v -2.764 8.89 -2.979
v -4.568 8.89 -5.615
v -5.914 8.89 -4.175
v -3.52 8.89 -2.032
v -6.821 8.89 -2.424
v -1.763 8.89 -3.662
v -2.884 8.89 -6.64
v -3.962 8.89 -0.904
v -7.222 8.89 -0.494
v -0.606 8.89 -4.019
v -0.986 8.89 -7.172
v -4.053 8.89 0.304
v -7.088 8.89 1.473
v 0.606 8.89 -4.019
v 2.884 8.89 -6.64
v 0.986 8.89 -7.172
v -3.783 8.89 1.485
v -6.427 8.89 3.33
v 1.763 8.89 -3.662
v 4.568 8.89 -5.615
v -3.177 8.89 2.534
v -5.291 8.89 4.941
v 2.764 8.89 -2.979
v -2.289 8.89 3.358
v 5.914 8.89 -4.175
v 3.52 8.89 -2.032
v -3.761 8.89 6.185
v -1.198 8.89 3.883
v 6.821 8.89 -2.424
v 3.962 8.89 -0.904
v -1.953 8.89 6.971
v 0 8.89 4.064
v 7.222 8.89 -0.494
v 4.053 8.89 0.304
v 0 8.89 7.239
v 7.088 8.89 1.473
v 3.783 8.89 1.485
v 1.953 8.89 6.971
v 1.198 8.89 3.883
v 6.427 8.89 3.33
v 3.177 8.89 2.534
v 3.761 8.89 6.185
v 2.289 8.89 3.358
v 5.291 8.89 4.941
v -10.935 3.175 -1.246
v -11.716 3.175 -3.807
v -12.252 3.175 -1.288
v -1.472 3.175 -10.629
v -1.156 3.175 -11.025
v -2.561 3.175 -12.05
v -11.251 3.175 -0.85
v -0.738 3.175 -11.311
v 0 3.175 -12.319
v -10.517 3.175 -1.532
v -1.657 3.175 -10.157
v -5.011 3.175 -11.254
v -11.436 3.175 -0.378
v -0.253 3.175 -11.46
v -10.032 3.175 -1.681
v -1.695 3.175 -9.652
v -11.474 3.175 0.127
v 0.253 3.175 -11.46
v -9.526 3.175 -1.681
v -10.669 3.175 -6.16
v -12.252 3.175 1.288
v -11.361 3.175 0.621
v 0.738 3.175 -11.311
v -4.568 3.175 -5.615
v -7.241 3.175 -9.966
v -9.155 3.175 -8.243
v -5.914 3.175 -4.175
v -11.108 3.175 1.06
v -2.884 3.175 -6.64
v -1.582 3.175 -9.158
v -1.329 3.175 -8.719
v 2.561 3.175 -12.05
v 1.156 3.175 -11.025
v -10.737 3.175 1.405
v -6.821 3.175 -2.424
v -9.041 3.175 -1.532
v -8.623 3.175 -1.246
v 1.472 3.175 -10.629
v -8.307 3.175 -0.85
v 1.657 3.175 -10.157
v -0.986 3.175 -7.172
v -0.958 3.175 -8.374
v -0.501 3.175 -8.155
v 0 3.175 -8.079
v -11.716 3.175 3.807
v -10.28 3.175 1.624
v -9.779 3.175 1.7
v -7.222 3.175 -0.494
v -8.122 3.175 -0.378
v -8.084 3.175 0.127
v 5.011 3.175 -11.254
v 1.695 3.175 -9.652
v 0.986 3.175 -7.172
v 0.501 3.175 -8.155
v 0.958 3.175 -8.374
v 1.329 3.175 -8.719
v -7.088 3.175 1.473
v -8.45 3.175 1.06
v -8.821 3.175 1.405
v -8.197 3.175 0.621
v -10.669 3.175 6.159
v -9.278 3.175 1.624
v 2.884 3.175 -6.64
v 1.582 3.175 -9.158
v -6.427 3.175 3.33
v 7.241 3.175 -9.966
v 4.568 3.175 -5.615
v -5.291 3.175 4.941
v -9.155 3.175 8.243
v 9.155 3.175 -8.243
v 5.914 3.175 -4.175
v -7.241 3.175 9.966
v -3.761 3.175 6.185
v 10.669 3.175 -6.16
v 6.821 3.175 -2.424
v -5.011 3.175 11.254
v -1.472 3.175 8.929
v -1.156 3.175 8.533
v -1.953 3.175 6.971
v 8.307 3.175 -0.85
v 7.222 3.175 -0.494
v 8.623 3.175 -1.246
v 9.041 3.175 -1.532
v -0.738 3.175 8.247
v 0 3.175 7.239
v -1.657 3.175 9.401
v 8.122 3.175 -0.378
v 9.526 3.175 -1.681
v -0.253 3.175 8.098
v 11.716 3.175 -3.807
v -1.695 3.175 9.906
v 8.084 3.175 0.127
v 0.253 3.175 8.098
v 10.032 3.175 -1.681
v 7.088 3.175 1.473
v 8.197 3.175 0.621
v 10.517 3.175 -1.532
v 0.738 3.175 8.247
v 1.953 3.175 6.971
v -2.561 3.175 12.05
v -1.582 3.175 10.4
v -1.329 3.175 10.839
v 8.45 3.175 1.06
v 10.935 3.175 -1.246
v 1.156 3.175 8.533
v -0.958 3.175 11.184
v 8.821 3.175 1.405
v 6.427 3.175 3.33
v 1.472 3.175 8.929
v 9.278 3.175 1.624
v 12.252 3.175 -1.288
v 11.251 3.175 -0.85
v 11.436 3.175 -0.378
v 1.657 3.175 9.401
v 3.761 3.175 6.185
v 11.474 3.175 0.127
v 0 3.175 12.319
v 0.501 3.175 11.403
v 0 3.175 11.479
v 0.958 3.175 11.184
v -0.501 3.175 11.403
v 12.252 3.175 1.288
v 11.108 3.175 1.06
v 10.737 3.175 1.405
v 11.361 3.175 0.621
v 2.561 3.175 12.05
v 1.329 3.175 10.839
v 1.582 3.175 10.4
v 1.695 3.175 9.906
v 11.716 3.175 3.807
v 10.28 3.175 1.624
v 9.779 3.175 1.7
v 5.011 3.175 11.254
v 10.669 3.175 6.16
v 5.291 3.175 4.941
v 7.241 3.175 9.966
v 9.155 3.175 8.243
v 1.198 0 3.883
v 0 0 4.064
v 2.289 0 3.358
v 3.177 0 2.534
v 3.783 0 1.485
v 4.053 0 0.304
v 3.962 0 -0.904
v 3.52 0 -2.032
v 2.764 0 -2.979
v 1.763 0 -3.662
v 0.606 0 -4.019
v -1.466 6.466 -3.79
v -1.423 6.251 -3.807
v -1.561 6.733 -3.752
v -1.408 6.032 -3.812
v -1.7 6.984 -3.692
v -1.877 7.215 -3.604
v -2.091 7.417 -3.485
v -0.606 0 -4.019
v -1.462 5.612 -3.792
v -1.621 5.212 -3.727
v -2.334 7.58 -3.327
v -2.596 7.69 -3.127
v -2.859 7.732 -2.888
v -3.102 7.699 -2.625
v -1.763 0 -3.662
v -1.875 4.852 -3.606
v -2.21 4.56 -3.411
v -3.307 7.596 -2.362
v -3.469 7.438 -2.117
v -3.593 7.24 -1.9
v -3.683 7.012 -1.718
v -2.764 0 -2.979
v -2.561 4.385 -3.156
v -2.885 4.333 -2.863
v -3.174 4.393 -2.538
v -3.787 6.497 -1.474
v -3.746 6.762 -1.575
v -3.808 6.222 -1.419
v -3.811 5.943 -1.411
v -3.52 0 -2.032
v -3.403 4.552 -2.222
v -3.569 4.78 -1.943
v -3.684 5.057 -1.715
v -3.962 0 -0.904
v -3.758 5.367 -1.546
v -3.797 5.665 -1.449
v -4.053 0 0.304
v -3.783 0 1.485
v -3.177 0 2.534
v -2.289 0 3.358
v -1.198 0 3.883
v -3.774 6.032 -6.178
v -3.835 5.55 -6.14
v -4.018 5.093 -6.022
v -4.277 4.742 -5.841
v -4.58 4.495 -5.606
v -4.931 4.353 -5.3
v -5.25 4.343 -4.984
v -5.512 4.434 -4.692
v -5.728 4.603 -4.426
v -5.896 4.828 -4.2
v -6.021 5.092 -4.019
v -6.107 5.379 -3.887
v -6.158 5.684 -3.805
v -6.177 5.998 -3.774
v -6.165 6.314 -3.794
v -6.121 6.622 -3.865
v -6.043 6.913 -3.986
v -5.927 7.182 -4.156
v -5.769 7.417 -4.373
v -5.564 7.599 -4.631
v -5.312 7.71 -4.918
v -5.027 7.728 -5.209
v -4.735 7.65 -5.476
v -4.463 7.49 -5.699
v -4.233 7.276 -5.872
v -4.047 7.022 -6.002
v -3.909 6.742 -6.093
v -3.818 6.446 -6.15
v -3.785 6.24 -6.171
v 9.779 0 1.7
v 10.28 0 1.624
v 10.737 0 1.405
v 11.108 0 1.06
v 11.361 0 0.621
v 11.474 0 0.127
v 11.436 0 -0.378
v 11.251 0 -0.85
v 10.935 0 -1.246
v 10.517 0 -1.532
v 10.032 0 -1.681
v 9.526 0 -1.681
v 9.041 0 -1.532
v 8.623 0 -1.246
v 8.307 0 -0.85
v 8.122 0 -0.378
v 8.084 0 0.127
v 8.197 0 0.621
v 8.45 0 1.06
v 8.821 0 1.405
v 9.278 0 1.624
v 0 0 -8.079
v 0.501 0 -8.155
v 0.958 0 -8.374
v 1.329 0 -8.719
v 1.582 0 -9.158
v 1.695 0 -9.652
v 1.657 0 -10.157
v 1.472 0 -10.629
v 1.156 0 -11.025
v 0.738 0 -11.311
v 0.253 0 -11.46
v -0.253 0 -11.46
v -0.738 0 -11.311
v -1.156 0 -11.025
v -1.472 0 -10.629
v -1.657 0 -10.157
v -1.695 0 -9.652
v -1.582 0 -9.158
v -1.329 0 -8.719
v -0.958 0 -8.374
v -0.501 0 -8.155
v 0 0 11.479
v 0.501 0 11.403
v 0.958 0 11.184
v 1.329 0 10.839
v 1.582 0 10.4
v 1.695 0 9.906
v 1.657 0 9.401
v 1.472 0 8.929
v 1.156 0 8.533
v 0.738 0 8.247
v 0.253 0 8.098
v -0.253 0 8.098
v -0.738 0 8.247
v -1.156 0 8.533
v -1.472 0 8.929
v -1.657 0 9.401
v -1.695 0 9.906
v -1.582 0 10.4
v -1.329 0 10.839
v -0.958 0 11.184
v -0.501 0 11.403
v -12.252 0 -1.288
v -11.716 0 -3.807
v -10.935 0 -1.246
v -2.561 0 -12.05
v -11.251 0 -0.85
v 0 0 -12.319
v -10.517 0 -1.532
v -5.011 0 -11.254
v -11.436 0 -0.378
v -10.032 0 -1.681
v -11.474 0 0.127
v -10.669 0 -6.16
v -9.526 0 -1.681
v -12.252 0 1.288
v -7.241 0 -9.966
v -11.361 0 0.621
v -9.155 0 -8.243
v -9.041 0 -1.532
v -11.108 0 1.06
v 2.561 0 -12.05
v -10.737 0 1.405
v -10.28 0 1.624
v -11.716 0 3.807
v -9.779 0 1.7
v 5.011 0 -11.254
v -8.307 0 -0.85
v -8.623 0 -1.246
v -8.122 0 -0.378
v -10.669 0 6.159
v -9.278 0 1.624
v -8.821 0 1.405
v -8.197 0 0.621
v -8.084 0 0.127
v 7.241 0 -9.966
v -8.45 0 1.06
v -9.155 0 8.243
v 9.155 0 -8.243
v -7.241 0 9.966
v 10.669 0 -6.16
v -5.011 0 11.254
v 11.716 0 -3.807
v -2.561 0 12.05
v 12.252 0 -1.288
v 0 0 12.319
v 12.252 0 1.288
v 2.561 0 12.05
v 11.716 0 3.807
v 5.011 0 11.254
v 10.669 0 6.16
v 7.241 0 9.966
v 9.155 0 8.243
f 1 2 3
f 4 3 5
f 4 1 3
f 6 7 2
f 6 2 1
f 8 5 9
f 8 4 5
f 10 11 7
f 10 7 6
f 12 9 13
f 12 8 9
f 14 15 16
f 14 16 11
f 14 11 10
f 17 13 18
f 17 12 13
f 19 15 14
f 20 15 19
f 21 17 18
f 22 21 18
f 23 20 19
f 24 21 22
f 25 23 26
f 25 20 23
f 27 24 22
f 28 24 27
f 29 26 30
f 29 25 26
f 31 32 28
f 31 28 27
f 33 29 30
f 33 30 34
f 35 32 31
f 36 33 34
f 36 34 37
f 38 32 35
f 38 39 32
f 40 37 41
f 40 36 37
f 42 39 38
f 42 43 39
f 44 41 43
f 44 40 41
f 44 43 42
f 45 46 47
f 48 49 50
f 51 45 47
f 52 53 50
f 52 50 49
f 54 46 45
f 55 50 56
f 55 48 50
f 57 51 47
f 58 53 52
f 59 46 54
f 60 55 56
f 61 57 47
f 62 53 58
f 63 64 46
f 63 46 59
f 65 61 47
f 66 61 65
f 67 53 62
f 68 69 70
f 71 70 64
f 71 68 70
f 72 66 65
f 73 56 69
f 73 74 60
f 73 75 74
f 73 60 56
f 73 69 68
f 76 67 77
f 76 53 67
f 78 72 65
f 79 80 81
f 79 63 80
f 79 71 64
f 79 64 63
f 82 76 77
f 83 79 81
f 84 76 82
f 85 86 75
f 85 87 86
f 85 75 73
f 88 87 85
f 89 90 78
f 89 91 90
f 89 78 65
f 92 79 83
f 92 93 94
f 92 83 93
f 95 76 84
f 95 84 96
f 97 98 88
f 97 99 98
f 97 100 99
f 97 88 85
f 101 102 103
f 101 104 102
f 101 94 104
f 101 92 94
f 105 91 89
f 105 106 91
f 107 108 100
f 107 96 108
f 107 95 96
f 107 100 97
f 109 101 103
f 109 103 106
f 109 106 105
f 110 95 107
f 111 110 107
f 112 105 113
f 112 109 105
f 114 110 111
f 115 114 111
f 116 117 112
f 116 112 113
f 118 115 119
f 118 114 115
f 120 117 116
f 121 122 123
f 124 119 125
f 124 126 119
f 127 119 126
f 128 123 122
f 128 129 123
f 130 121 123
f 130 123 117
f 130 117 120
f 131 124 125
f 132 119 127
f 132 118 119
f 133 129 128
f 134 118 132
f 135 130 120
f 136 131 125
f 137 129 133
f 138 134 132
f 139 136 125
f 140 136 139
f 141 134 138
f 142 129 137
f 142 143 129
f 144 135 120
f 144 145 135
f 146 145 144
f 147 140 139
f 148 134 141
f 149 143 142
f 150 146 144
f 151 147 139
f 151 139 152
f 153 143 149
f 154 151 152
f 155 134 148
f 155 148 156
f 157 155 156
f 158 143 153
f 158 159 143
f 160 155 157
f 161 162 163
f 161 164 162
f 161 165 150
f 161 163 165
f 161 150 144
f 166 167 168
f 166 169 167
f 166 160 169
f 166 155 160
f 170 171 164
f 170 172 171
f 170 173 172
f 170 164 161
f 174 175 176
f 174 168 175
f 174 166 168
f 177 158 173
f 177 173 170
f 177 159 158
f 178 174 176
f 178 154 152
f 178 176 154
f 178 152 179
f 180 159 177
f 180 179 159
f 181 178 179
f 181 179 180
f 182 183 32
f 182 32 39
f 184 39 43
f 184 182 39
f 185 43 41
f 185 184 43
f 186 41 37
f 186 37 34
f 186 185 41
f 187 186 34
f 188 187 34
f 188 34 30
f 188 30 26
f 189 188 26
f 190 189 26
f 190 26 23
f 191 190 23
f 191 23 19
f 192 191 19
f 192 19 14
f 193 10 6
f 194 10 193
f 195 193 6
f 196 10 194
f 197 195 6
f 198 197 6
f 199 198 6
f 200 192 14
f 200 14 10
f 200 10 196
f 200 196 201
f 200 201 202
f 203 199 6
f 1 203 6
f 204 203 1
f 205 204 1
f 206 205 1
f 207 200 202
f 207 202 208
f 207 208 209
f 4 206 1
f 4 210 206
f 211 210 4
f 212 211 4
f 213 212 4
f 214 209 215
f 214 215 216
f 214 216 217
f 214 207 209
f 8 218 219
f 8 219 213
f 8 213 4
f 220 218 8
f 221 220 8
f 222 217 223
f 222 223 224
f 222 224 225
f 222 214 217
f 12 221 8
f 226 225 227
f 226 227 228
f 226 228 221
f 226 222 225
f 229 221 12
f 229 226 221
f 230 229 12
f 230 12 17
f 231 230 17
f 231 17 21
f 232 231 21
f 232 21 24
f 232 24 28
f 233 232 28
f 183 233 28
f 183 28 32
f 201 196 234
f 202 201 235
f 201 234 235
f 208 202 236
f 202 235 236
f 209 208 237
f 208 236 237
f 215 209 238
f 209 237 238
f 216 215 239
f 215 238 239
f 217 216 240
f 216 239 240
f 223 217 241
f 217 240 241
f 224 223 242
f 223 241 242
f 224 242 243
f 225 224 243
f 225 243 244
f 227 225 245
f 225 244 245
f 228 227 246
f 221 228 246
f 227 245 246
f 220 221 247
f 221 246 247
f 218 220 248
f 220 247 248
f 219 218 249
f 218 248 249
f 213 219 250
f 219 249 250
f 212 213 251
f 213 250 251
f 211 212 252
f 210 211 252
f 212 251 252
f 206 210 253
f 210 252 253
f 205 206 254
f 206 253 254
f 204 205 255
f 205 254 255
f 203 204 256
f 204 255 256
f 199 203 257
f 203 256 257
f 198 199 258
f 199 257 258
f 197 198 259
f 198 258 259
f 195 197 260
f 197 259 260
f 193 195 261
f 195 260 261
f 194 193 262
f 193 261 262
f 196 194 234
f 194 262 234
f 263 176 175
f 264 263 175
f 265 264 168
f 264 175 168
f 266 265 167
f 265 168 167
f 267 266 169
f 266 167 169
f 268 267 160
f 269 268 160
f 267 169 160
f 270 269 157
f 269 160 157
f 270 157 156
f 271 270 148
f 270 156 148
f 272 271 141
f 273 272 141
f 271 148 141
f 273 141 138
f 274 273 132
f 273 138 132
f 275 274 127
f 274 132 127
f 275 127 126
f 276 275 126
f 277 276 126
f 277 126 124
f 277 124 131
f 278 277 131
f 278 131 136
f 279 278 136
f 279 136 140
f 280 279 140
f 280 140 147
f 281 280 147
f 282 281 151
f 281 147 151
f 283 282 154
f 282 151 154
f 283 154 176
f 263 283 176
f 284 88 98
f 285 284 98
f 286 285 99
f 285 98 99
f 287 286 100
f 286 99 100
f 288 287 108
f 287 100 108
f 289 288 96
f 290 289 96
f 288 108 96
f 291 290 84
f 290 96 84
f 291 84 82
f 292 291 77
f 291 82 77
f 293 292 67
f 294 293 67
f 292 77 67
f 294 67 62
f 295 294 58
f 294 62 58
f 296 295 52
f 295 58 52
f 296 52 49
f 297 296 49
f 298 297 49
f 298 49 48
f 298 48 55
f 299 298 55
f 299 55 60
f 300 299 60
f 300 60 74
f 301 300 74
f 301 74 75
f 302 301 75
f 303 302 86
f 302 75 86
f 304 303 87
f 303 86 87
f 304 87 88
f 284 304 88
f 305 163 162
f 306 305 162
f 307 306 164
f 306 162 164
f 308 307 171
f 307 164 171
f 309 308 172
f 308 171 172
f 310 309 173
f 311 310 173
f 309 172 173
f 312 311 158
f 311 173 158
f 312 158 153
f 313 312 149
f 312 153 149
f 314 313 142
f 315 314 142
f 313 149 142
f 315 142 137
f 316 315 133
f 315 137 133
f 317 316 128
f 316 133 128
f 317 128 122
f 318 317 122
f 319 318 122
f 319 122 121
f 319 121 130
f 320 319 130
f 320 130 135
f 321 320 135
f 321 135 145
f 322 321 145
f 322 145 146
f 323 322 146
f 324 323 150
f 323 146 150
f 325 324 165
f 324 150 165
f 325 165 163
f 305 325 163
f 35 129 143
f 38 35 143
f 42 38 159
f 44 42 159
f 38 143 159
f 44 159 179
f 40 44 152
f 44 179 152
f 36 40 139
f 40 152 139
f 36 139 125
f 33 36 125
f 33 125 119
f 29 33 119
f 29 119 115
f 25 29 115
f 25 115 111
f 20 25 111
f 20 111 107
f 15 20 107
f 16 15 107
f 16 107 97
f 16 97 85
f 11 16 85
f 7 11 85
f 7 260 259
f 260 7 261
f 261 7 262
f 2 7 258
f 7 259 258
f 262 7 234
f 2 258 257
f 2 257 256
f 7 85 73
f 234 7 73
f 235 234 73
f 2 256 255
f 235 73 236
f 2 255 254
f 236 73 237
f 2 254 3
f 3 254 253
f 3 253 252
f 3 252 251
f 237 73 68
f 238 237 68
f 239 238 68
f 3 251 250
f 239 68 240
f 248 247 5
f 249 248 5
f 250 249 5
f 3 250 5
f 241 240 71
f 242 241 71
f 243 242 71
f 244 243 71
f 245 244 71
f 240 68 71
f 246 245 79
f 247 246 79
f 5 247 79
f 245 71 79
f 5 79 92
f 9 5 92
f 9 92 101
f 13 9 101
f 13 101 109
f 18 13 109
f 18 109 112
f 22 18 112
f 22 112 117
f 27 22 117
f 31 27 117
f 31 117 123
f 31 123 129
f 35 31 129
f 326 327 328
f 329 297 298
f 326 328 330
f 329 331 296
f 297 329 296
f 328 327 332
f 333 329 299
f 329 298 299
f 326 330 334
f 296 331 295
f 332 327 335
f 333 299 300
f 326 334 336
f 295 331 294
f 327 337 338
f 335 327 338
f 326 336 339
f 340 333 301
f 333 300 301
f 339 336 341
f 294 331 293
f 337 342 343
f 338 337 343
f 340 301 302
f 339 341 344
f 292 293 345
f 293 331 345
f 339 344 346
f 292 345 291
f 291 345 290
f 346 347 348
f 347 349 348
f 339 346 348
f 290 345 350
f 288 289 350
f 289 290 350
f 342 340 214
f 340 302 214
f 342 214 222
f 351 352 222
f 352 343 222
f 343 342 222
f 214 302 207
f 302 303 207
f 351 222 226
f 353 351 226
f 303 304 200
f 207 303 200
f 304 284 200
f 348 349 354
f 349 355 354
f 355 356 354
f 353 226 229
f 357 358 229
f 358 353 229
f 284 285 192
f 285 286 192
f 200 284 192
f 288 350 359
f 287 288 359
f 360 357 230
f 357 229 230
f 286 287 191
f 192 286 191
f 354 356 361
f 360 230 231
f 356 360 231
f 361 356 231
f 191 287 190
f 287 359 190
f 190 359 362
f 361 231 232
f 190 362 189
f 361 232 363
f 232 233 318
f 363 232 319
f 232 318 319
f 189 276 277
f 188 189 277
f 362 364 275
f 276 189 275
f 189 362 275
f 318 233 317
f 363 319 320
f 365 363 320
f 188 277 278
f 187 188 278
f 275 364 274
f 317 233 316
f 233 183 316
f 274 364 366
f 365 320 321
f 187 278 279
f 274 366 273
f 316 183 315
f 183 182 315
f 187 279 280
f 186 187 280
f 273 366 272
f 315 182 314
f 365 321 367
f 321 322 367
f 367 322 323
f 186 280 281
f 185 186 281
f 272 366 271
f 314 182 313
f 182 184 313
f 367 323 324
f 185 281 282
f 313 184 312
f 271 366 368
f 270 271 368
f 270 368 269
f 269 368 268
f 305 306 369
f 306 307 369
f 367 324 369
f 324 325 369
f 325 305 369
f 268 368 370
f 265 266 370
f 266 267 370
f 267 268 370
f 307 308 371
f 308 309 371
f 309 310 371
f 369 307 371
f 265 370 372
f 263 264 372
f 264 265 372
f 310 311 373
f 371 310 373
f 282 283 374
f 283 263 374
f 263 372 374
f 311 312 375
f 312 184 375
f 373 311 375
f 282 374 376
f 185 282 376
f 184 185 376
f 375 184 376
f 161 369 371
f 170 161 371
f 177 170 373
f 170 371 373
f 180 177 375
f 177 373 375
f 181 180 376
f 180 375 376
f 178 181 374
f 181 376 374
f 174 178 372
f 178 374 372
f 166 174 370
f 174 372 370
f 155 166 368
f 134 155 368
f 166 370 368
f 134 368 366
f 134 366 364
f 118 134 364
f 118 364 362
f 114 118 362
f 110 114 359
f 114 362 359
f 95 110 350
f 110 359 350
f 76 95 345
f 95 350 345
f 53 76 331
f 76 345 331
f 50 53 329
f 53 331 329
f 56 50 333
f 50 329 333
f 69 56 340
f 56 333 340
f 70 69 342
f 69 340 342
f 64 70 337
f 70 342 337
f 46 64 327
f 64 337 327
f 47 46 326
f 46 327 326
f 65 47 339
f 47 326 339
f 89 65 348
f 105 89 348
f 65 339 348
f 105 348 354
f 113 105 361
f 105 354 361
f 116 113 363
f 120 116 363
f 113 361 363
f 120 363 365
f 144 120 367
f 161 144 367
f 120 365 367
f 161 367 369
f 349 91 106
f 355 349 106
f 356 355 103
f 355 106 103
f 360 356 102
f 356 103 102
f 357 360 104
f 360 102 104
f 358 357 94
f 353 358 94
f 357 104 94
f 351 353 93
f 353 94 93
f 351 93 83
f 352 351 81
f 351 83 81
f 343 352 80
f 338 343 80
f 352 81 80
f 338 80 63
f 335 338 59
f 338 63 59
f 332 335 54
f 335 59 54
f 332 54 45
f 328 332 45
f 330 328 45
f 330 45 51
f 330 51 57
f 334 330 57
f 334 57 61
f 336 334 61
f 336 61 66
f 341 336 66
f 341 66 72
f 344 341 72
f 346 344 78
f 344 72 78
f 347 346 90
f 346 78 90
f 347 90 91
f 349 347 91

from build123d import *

# Parameters (mm, degrees)
SKETCH1_R                           = 7.239
SKETCH1_R_2                         = 4.064
BOSS_EXTRUDE1_DEPTH                 = 8.89
SKETCH1_3_R                         = 12.319
SKETCH1_3_R_2                       = 7.239
BOSS_EXTRUDE2_DEPTH                 = 3.175
SKETCH2_R                           = 1.7
CUT_EXTRUDE1_DEPTH                  = 3.175
CUT_EXTRUDE2_REACH                  = 27.909
CUT_EXTRUDE2_END_RADIUS             = 4.064
SKETCH5_R                           = 1.7
CUT_EXTRUDE2_DIRECTION_2_REACH      = 27.909
CUT_EXTRUDE2_DIRECTION_2_END_RADIUS = 7.239


with BuildPart() as part:
    # Sketch1 → Boss-Extrude1 (new body)
    with BuildSketch(Plane(origin=(0, 0, 0), x_dir=(1, 0, 0), z_dir=(0, 1, 0))):
        with Locations(Location((0, 0, 0), (0, 0, 270))):
            Circle(SKETCH1_R)
        with Locations(Location((0, 0, 0), (0, 0, 270))):
            Circle(SKETCH1_R_2, mode=Mode.SUBTRACT)
    extrude(amount=BOSS_EXTRUDE1_DEPTH)

    # Sketch1<3> → Boss-Extrude2 (add)
    with BuildSketch(Plane(origin=(0, 0, 0), x_dir=(1, 0, 0), z_dir=(0, 1, 0))):
        with Locations(Location((0, 0, 0), (0, 0, 270))):
            Circle(SKETCH1_3_R)
        with Locations(Location((0, 0, 0), (0, 0, 270))):
            Circle(SKETCH1_3_R_2, mode=Mode.SUBTRACT)
    extrude(amount=BOSS_EXTRUDE2_DEPTH)

    # Sketch2 → Cut-Extrude1 (cut)
    with BuildSketch(Plane(origin=(0, 3.175, 0), x_dir=(1, 0, 0), z_dir=(0, 1, 0))):
        with Locations(Location((0, 9.779, 0), (0, 0, 270))):
            Circle(SKETCH2_R)
        with Locations(Location((9.779, 0, 0), (0, 0, 270))):
            Circle(SKETCH2_R)
        with Locations(Location((0, -9.779, 0), (0, 0, 270))):
            Circle(SKETCH2_R)
        with Locations(Location((-9.779, 0, 0), (0, 0, 270))):
            Circle(SKETCH2_R)
    extrude(amount=-CUT_EXTRUDE1_DEPTH, mode=Mode.SUBTRACT)

    # Cut-Extrude2: up to this cylinder (the profile starts outside it)
    cut_extrude2_end = Plane(origin=(0, 6.0325, 0), z_dir=(0, -1, 0)) * Cylinder(CUT_EXTRUDE2_END_RADIUS, 64.946, mode=Mode.PRIVATE)
    # Sketch5 → Cut-Extrude2 (cut, up to the surface)
    with BuildSketch(Plane(origin=(-4.8895, 0, -4.8895), x_dir=(-0.7071067811865475, 0, 0.7071067811865477), z_dir=(-0.7071067811865477, 0, -0.7071067811865475)), mode=Mode.PRIVATE) as cut_extrude2_sk1:
        with Locations(Location((0, 6.0325, 0), (0, 0, 180))):
            Circle(SKETCH5_R)
    cut_extrude2_tool1 = extrude(cut_extrude2_sk1.sketch, amount=-CUT_EXTRUDE2_REACH, mode=Mode.PRIVATE) - cut_extrude2_end
    add(cut_extrude2_tool1.solids().sort_by_distance((-4.8895, 6.0325, -4.8895))[0], mode=Mode.SUBTRACT)

    # Cut-Extrude2 direction 2: up to this cylinder (the profile starts inside it)
    cut_extrude2_direction_2_end = Plane(origin=(0, 6.0325, 0), z_dir=(0, -1, 0)) * Cylinder(CUT_EXTRUDE2_DIRECTION_2_END_RADIUS, 71.296, mode=Mode.PRIVATE)
    # Sketch5 → Cut-Extrude2 direction 2 (cut, up to the surface)
    with BuildSketch(Plane(origin=(-4.8895, 0, -4.8895), x_dir=(-0.7071067811865475, 0, 0.7071067811865477), z_dir=(-0.7071067811865477, 0, -0.7071067811865475)), mode=Mode.PRIVATE) as cut_extrude2_direction_2_sk1:
        with Locations(Location((0, 6.0325, 0), (0, 0, 180))):
            Circle(SKETCH5_R)
    cut_extrude2_direction_2_tool1 = extrude(cut_extrude2_direction_2_sk1.sketch, amount=CUT_EXTRUDE2_DIRECTION_2_REACH, mode=Mode.PRIVATE) & cut_extrude2_direction_2_end
    add(cut_extrude2_direction_2_tool1.solids().sort_by_distance((-4.8895, 6.0325, -4.8895))[0], mode=Mode.SUBTRACT)


solid = part.part
